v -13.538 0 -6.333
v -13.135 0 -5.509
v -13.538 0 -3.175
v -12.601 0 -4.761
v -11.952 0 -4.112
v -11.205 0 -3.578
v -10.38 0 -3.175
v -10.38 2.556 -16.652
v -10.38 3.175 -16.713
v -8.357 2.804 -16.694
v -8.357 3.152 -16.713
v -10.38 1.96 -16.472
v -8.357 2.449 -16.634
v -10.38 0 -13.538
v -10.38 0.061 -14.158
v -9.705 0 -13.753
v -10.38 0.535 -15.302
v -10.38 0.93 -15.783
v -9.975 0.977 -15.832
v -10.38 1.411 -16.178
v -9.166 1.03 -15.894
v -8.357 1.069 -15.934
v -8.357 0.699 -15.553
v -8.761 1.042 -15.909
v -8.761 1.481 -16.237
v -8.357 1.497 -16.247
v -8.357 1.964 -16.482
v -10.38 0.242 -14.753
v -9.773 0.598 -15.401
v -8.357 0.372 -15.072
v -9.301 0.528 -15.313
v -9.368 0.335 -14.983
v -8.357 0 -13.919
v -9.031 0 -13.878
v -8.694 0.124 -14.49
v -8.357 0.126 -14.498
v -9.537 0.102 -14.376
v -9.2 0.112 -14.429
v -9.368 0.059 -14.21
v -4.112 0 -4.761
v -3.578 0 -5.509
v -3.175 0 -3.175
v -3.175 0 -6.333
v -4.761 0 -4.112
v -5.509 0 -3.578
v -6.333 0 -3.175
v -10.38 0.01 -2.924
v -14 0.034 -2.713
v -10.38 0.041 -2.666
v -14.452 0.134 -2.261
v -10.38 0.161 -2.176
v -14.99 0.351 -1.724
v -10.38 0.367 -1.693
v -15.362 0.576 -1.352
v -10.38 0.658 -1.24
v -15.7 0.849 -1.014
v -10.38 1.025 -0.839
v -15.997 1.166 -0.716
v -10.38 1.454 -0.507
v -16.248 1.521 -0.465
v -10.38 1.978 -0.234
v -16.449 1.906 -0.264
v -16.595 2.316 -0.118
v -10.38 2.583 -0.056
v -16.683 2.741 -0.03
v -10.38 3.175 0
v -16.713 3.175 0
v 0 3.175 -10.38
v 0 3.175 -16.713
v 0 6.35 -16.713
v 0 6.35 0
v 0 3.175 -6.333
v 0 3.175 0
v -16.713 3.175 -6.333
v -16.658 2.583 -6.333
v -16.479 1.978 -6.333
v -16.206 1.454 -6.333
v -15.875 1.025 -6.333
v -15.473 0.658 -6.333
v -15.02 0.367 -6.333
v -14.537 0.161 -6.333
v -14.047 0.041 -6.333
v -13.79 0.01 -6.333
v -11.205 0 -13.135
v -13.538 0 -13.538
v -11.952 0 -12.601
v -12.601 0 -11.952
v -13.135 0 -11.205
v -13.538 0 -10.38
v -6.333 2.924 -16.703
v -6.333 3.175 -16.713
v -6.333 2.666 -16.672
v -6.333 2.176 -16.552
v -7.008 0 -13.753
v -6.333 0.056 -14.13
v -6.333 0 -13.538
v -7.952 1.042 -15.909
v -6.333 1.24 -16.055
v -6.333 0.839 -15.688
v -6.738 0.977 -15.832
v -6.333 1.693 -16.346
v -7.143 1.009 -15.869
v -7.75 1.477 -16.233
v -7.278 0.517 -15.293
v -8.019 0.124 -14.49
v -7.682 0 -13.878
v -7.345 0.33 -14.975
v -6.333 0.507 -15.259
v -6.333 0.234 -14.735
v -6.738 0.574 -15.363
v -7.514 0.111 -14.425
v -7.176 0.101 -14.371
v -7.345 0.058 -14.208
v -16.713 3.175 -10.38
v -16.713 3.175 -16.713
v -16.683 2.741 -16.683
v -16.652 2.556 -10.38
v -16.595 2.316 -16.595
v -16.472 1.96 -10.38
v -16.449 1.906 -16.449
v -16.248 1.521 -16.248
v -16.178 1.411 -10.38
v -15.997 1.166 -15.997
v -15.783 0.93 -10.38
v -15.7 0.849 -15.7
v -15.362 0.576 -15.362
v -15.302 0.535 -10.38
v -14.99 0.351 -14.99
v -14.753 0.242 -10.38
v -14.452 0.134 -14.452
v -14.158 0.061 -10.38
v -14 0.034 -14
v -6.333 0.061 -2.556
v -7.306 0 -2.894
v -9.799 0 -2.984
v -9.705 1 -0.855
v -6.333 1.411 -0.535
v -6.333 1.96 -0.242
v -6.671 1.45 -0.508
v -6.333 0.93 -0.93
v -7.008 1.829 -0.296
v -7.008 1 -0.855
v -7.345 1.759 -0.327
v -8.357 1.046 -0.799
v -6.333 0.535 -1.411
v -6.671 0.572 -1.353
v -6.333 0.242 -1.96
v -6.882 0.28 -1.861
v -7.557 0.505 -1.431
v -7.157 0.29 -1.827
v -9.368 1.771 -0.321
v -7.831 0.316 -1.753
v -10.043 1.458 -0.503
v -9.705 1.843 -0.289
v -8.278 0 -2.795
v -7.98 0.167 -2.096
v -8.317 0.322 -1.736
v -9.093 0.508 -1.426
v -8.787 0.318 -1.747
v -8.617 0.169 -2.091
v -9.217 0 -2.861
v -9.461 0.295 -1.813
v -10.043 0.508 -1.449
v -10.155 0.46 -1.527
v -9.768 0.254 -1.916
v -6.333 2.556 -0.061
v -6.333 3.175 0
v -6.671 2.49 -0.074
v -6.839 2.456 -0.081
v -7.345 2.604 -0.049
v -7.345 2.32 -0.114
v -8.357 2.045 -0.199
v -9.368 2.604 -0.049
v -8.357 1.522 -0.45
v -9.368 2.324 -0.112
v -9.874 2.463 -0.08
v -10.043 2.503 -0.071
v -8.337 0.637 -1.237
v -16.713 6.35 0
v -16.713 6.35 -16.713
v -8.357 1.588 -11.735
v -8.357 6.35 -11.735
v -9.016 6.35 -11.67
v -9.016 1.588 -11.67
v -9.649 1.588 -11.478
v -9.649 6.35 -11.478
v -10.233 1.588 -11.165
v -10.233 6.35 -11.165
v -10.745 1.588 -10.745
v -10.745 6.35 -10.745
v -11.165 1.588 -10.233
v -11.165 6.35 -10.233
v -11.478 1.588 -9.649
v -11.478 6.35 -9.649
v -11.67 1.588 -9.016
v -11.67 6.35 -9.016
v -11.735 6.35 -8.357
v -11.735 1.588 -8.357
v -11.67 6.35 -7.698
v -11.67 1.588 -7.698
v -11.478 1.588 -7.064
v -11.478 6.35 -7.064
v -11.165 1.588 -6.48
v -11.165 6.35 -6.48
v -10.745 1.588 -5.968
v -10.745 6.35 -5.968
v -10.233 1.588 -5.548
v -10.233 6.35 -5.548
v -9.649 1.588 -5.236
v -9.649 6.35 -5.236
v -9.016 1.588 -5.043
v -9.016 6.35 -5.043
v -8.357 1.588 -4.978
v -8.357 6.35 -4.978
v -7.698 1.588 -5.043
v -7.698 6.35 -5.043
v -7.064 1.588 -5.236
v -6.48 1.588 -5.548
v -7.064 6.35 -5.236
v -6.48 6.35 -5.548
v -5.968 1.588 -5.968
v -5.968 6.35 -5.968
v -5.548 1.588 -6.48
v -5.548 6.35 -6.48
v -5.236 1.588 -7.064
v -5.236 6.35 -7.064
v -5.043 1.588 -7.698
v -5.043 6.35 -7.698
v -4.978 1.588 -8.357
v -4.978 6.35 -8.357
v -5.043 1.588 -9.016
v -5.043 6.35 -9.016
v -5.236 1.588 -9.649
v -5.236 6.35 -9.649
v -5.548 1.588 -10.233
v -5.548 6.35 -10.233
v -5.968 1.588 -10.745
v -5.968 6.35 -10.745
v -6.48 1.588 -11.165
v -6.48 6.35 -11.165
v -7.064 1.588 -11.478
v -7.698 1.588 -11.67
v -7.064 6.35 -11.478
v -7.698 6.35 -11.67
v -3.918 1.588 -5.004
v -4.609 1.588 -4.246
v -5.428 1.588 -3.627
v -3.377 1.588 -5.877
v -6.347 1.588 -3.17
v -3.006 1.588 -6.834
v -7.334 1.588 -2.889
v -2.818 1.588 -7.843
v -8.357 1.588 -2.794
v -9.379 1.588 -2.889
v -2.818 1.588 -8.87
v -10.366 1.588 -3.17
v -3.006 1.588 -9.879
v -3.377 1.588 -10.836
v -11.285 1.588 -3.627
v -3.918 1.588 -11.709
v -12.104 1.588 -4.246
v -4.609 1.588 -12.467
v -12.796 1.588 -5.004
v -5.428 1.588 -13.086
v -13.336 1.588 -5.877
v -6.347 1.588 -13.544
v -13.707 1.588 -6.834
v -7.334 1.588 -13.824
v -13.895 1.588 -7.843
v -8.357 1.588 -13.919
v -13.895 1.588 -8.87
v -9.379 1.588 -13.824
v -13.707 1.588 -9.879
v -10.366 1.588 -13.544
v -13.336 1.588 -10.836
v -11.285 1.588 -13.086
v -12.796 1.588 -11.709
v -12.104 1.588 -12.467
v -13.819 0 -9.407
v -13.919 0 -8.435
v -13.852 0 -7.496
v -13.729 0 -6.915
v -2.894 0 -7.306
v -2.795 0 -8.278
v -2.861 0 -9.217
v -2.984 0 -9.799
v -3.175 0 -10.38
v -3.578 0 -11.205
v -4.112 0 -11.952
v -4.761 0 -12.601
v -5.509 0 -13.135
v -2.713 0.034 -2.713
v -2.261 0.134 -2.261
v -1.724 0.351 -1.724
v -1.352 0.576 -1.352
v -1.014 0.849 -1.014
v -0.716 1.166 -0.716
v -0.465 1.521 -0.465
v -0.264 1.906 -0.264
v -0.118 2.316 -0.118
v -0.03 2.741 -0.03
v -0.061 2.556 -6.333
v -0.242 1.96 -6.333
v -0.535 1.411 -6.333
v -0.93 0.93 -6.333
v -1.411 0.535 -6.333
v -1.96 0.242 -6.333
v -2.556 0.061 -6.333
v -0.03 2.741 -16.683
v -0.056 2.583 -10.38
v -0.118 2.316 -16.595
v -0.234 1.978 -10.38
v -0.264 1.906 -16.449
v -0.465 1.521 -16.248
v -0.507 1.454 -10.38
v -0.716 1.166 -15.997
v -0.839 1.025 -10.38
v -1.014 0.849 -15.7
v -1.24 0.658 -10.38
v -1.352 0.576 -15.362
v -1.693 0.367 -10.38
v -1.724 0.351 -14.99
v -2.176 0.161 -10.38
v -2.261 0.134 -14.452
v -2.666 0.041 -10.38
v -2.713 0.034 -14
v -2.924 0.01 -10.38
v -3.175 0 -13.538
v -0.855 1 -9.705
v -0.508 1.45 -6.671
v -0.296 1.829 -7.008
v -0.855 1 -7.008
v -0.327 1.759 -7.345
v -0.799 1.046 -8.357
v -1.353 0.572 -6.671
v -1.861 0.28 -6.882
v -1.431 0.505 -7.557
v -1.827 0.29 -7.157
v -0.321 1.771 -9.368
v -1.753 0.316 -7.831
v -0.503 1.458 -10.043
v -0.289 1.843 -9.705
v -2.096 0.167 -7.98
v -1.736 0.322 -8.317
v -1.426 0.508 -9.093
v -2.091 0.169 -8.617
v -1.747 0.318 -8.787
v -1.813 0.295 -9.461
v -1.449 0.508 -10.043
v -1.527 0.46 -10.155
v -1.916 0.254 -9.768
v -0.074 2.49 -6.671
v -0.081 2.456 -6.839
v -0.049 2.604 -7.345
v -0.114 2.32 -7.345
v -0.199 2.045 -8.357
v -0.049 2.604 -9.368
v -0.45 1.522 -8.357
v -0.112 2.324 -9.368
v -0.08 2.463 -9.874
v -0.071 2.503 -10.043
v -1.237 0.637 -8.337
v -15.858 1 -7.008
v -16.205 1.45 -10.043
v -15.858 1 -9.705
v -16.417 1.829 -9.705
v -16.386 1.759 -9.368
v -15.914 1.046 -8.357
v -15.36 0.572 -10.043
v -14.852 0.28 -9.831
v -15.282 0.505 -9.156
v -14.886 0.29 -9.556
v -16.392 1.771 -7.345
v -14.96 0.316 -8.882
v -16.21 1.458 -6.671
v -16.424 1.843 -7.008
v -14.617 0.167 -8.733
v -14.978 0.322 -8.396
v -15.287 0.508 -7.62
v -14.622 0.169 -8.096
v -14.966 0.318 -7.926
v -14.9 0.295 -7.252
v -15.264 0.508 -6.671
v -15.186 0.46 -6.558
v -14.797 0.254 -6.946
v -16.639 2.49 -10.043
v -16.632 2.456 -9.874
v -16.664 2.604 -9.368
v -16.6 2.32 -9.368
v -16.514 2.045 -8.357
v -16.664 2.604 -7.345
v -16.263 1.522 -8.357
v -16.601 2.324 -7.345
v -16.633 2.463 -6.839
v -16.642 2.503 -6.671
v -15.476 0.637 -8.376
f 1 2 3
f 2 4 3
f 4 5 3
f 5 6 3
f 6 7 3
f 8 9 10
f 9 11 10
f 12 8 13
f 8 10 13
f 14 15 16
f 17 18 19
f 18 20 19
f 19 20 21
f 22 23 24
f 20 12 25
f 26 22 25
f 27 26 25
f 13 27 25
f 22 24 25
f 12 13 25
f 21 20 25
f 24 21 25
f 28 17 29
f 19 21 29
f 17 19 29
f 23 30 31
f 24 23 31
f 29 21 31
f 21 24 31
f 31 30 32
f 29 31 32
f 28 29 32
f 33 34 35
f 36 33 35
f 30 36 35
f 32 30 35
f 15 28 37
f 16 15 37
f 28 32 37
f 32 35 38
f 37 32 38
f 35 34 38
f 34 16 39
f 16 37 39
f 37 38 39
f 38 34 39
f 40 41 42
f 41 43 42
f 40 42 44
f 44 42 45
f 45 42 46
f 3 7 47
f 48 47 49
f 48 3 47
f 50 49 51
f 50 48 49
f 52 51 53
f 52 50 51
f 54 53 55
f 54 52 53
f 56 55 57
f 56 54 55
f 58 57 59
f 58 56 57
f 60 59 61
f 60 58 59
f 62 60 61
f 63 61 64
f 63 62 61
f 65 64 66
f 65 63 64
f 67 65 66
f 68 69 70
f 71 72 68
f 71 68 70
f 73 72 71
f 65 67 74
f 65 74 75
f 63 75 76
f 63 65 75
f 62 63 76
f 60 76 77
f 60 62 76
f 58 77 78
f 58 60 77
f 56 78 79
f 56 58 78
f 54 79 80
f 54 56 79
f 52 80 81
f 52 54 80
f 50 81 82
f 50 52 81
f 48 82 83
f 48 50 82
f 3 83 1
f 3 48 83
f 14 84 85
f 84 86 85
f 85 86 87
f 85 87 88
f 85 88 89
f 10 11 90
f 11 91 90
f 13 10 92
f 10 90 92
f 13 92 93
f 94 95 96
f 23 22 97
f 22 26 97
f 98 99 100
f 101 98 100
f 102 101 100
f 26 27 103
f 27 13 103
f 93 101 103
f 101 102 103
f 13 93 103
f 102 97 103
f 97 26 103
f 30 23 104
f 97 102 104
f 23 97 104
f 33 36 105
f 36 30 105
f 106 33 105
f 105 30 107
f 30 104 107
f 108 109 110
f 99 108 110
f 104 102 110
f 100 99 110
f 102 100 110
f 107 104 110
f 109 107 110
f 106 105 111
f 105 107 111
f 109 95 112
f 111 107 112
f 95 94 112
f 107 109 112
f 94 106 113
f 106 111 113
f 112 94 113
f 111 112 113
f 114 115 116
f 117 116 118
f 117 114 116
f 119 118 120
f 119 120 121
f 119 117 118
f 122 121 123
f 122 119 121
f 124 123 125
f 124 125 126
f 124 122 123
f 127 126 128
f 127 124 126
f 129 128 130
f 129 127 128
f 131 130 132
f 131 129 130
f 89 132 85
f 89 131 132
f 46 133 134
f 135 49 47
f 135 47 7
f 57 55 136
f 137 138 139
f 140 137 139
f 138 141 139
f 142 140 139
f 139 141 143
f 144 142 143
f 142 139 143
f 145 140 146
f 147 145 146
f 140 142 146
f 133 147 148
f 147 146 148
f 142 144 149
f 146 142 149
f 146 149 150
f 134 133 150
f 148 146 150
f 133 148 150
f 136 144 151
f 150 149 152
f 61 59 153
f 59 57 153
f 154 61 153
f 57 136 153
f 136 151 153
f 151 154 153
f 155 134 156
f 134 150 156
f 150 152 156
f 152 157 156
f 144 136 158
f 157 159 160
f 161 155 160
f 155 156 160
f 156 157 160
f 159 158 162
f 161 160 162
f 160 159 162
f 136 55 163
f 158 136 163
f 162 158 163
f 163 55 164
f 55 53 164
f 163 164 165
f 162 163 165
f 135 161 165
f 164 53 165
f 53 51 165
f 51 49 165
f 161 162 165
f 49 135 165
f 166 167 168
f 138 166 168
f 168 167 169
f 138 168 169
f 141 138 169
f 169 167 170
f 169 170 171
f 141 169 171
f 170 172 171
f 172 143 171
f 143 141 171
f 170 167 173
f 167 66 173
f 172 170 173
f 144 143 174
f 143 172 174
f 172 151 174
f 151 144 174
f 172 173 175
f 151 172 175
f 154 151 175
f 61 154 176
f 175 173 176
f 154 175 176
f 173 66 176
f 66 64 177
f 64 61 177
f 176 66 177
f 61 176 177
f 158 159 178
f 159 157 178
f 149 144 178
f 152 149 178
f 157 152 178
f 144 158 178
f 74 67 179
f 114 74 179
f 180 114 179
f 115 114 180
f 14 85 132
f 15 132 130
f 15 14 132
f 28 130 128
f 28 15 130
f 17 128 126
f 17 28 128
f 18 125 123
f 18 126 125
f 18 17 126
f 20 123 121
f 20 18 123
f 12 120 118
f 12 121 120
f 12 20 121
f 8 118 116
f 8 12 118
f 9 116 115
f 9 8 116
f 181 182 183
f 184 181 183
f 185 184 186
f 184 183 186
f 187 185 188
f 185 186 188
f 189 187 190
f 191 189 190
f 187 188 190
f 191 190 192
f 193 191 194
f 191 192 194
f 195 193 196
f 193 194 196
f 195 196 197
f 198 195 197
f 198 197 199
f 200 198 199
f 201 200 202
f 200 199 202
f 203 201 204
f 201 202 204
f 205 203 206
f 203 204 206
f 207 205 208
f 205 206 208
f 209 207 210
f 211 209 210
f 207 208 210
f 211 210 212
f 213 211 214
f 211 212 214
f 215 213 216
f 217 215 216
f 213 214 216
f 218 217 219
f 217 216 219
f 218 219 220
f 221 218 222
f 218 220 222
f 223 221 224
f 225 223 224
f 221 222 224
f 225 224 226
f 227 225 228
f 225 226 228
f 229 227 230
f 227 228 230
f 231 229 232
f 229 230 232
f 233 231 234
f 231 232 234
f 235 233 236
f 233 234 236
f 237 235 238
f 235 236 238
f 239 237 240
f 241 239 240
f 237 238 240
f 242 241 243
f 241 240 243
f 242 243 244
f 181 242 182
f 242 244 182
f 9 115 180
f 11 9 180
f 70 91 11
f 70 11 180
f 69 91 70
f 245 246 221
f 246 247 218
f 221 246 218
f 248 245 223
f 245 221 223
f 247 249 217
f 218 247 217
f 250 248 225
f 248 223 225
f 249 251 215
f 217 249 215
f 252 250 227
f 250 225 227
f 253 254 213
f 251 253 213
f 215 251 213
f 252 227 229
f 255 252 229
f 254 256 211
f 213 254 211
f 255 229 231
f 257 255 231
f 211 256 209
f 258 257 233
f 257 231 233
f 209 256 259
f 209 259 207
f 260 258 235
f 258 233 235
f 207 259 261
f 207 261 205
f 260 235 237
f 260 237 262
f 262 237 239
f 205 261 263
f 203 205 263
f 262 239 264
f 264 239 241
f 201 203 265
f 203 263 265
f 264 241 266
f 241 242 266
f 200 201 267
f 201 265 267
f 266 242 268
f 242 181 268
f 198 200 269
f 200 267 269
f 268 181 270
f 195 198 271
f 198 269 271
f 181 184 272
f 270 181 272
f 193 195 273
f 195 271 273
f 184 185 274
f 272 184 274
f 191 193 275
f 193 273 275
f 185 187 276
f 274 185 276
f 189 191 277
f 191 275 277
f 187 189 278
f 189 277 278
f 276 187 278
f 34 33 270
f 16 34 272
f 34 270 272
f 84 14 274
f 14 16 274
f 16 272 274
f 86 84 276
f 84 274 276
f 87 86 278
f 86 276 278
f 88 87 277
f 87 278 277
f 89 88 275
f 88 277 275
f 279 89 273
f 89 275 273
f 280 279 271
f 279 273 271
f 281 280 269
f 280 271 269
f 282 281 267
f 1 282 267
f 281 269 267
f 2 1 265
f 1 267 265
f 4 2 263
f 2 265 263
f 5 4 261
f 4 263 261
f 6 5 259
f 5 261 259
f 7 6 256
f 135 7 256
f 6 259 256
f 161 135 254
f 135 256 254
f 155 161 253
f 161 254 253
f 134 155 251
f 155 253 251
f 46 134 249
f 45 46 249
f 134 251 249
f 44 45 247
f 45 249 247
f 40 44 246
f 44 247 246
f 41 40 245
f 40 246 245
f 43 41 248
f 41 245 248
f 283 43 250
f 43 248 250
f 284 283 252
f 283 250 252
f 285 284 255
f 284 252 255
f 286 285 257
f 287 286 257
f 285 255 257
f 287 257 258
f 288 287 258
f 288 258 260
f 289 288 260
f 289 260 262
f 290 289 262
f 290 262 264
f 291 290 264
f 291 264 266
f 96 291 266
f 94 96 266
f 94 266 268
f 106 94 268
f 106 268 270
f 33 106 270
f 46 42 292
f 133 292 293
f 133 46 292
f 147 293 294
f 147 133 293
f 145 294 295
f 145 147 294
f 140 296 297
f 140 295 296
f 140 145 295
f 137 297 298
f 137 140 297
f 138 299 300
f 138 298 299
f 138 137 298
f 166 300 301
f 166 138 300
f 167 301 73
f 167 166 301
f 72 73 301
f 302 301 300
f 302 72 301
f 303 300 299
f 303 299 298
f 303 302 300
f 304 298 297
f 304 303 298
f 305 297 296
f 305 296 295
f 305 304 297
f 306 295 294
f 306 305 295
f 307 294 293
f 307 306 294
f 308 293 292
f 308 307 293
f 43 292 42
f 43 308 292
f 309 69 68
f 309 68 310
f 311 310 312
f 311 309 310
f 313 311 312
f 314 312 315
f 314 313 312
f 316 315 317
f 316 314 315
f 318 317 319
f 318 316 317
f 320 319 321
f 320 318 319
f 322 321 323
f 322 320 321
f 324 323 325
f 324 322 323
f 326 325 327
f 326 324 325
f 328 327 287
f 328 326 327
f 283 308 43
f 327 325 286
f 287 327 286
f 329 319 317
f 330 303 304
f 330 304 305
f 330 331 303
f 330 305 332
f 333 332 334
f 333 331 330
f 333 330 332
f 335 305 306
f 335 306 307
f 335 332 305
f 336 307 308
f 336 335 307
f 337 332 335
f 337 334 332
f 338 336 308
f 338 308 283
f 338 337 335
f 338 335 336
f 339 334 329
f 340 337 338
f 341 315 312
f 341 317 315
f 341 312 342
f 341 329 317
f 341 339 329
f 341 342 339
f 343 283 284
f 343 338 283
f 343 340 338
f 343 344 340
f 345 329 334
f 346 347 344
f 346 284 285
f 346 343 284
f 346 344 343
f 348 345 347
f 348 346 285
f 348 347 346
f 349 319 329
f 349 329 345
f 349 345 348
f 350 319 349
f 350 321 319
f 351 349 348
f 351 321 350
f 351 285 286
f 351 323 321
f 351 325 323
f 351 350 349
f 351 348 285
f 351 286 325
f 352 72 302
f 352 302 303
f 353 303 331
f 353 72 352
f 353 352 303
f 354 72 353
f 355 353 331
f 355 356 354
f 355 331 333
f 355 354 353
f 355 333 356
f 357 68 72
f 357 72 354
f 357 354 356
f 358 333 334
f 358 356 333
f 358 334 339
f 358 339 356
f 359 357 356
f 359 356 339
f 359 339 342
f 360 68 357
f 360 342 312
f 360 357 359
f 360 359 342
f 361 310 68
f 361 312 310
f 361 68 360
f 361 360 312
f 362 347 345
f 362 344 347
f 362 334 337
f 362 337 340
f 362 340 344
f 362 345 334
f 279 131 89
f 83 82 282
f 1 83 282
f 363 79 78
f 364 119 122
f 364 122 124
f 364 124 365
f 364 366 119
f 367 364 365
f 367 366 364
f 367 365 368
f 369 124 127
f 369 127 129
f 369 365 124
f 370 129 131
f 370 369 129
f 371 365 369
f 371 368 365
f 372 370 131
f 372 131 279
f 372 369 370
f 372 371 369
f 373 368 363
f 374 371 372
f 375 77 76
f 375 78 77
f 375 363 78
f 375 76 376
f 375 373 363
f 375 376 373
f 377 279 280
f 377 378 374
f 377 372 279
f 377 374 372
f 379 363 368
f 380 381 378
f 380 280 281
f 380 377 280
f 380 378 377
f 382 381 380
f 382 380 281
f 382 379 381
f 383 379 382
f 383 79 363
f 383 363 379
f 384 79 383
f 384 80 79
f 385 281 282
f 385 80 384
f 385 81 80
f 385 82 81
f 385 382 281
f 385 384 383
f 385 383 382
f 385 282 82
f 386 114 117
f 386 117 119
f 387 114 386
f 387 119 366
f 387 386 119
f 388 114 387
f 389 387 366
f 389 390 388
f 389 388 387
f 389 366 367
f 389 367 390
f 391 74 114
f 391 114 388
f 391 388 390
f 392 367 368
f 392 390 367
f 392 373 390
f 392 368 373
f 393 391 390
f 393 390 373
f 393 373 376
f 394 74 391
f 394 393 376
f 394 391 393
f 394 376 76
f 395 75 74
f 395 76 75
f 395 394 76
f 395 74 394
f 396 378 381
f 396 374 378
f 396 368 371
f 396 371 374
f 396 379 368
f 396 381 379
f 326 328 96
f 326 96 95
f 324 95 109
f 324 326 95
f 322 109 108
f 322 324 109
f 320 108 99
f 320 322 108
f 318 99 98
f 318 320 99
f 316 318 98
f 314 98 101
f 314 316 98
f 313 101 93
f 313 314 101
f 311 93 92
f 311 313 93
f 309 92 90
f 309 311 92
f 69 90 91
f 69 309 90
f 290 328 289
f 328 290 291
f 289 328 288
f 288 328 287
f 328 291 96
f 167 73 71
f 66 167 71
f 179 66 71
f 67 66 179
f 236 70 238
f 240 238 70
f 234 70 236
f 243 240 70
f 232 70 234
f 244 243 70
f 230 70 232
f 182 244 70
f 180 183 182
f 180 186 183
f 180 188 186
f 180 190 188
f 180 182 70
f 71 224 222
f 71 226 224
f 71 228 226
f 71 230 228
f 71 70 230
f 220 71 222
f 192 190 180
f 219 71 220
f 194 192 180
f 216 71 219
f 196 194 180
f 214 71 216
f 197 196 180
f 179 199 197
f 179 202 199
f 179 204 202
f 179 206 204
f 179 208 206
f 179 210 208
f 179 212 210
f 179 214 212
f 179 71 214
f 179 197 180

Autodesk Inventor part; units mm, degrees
ref_plane "YZ Plane" through (0, 0, 0) normal (1, 0, 0) x (0, 1, 0)
ref_plane "XZ Plane" through (0, 0, 0) normal (0, 1, 0) x (-1, 0, 0)
ref_plane "XY Plane" through (0, 0, 0) normal (0, 0, 1) x (1, 0, 0)
sketch "Sketch1" plane through (0, 0, 0) normal (0, 1, 0) x (-1, 0, 0)
  line L0 (0, 0) -> (16.7132, 0)
  line L1 (16.7132, 0) -> (16.7132, -16.7132)
  line L2 (16.7132, -16.7132) -> (0, -16.7132)
  line L3 (0, -16.7132) -> (0, 0)
  line L4 (16.7132, 0) -> (16.7132, -8.3566)
  line L5 (16.7132, -16.7132) -> (8.2065, -16.7132)
  line L6 (0, 0) -> (0, -8.3566)
  line L7 (0, -8.3566) -> (16.7132, -8.3566)
  line L8 (16.7132, -8.3566) -> (8.3566, -8.3566)
  dimension "d0" = 16.7132
  dimension "d1" = 16.7132
extrude "Extrusion1" add sketch "Sketch1" along normal blind 6.35
hole "Hole1" at (-8.3566, 0, -8.3566) direction (0, 1, 0) diameter 6.7564 end through all counterbore diameter 11.1252 counterbore depth 1.5875 clearance for "Socket Head Cap Screw" size "1/4" standard "Ansi Unified Screw Threads"
fillet "Fillet1" radius 3.175 4 edges at (-8.3566, 0, 0) (-16.7132, 0, -8.3566) (0, 0, -8.3566) (-8.3566, 0, -16.7132)
properties part number "SquareRetainingClip"
